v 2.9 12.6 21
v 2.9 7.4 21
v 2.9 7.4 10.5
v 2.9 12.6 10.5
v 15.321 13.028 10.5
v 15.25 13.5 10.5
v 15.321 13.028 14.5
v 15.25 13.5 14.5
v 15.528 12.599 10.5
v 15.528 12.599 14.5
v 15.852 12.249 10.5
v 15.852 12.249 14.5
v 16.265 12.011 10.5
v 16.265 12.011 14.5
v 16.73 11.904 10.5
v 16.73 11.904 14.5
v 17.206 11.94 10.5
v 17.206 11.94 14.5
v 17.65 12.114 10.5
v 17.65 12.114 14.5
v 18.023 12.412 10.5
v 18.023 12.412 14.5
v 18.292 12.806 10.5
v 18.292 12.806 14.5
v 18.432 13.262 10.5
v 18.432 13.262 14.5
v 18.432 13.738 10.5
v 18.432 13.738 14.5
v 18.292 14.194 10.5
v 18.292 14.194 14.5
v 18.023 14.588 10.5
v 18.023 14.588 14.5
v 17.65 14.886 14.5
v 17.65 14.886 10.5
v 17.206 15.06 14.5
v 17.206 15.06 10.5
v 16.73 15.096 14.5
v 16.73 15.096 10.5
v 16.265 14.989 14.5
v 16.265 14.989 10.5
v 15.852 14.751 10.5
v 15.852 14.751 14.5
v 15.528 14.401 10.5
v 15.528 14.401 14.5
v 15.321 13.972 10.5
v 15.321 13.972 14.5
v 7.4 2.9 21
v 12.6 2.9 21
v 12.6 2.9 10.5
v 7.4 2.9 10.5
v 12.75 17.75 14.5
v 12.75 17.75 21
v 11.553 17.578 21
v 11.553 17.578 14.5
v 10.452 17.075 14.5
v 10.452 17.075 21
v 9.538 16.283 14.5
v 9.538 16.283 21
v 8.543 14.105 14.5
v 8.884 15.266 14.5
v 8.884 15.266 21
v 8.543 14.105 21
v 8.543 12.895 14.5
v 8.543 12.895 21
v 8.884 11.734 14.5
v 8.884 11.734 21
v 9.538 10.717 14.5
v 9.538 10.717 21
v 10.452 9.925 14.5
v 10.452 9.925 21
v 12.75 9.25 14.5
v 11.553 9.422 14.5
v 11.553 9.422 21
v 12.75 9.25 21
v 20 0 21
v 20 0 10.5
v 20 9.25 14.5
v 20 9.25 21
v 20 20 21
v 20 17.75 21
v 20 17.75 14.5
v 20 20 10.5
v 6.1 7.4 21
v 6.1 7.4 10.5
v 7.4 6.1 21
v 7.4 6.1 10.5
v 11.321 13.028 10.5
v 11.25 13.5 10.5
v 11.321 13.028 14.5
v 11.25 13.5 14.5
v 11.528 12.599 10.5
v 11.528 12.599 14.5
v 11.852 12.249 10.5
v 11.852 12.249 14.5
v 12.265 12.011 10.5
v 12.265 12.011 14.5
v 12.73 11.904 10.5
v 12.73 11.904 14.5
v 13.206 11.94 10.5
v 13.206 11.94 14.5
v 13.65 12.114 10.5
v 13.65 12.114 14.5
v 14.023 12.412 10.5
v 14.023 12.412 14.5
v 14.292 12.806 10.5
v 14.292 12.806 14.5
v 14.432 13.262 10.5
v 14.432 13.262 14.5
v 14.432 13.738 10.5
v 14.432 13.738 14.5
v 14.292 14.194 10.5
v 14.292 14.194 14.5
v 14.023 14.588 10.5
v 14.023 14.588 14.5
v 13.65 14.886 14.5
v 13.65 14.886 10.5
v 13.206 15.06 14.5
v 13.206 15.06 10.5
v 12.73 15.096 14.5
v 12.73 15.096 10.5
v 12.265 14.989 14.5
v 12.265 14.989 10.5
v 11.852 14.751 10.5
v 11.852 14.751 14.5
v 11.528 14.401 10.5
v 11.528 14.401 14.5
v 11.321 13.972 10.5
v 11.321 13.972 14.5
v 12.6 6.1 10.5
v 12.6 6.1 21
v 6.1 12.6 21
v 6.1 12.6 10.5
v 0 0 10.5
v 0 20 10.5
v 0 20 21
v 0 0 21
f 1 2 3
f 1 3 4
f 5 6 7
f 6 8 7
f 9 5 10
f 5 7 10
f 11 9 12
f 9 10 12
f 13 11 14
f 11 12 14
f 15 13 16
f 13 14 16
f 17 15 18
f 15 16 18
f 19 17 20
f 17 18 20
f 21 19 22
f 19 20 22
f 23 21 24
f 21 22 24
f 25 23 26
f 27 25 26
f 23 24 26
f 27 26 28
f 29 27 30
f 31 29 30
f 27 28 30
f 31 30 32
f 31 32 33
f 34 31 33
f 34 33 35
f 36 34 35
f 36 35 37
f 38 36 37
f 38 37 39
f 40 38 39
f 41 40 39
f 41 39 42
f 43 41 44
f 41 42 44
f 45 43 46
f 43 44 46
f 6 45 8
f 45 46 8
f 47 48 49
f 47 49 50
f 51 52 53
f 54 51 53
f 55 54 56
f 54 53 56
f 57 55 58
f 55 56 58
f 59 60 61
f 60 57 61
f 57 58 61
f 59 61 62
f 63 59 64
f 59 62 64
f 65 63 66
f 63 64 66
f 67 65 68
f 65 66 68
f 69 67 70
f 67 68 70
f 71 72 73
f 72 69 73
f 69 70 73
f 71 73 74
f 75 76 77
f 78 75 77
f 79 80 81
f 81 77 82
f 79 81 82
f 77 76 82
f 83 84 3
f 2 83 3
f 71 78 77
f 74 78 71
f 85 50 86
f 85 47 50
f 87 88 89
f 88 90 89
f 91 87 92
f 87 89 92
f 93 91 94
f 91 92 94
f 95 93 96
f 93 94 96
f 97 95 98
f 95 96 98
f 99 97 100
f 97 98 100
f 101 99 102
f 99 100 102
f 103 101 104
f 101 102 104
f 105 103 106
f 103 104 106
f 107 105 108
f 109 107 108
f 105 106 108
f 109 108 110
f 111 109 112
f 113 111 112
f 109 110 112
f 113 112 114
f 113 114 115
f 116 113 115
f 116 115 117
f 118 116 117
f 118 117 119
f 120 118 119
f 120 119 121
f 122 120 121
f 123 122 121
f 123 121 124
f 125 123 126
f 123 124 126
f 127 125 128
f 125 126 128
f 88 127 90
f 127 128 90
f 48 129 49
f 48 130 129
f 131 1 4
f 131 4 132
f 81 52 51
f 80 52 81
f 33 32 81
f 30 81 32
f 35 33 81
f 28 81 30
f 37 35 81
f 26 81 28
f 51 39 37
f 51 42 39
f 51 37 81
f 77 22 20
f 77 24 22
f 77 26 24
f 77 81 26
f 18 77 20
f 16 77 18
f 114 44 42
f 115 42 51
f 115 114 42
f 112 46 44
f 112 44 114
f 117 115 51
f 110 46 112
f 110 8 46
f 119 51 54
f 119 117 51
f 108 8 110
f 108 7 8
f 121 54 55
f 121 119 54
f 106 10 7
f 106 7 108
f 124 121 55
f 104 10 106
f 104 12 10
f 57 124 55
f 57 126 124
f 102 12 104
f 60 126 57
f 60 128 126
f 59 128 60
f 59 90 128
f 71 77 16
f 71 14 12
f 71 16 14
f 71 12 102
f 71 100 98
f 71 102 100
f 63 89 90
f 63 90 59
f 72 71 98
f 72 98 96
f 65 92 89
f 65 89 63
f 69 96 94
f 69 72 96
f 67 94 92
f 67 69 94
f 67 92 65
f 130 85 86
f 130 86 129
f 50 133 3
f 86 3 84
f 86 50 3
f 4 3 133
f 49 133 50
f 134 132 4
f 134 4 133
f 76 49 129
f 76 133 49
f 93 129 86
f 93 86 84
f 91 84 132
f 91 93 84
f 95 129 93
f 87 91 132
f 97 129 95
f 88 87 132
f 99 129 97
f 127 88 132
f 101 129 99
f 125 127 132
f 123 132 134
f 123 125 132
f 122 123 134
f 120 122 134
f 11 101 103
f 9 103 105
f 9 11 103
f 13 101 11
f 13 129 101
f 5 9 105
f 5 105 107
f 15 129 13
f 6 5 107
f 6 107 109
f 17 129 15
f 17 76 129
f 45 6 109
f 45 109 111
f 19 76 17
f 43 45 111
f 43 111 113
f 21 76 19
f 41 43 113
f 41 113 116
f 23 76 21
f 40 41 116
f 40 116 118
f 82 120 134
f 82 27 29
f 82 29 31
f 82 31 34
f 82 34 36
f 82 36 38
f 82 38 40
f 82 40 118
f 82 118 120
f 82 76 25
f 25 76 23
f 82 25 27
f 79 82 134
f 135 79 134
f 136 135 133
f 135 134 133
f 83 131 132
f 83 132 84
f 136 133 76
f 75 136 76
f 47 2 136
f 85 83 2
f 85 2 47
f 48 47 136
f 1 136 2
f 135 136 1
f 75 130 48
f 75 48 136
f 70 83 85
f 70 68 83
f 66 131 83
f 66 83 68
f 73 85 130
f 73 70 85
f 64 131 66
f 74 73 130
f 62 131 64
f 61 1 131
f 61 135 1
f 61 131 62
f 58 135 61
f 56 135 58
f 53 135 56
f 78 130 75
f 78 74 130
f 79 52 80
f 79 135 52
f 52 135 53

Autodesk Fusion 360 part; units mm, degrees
sketch "スケッチ1" plane through (0, 0, 0) normal (0, 0, 1) x (1, 0, 0)
  line L0 (0, 0) -> (20, 0)
  line L1 (20, 0) -> (20, 20)
  line L2 (20, 20) -> (0, 20)
  line L3 (0, 20) -> (0, 0)
  dimension "d1" = 20
  dimension "d2" = 20
extrude "押し出し1" add sketch "スケッチ1" along normal blind 21
sketch "スケッチ2" plane through (20, 0, 0) normal (1, 0, 0) x (0, 1, 0)
  line L0 (0, 0) -> (20, 0)
  line L1 (20, 0) -> (20, 21)
  line L2 (20, 21) -> (0, 21)
  line L3 (0, 21) -> (0, 0)
  circle A0 centre (5, 5) radius 1.15
  dimension "d5" = 2.3
  dimension "d8" = 5
  dimension "d11" = 5
extrude "押し出し2" cut sketch "スケッチ2" against normal blind 25 contours A0
sketch "スケッチ7" plane through (0, 0, 21) normal (0, 0, 1) x (-1, 0, 0)
  line L0 (0, -20) -> (0, 0)
  line L1 (0, 0) -> (-20, 0)
  line L2 (-20, 0) -> (-20, -20)
  line L3 (-20, -20) -> (0, -20)
  line L4 (-12.75, -17.75) -> (-20, -17.75)
  line L5 (-20, -17.75) -> (-20, -9.25)
  line L6 (-20, -9.25) -> (-12.75, -9.25)
  line L7 (-8.5, -13.5) -> (-20, -13.5)
  circle A0 centre (-12.85, -13.5) radius 1.6
  circle A1 centre (-16.85, -13.5) radius 1.6
  arc A2 (-12.75, -17.75) -> (-8.5, -13.5) centre (-12.75, -13.5) ccw
  arc A3 (-8.5, -13.5) -> (-12.75, -9.25) centre (-12.75, -13.5) ccw
  point P0 (-8.5, -17.75)
  point P1 (-8.5, -9.25)
  dimension "d16" = 8.5
  dimension "d17" = 11.5
  dimension "d18" = 3.2
  dimension "d19" = 3.2
  dimension "d20" = 4
  dimension "d21" = 4.35
  dimension "d22" = 4.25
  dimension "d23" = 4.25
  dimension "d24" = 4.25
extrude "押し出し4" cut sketch "スケッチ7" against normal blind 6.5 contours L2 L4 L5 L7 A0 A1 A2 | L2 L5 L6 L7 A0 A1 A3
extrude "押し出し5" cut 2 faces at (12.2215, 13.3267, 21) (16.1057, 13.3074, 21) along direction (0, 0, -1) blind 26
sketch "スケッチ11" plane through (20, 0, 0) normal (1, 0, 0) x (0, 1, 0)
  line L0 (17.75, 21) -> (17.75, 14.5)
  line L1 (17.75, 14.5) -> (9.25, 14.5)
  line L2 (9.25, 14.5) -> (9.25, 21)
  line L3 (9.25, 21) -> (0, 21)
  line L4 (0, 21) -> (0, 0)
  line L5 (0, 0) -> (20, 0)
  line L6 (20, 0) -> (20, 21)
  line L7 (20, 21) -> (17.75, 21)
  circle A0 centre (5, 5) radius 1.15
  line L8 (0, 10.5) -> (20, 10.5)
  line L9 (20, 10.5) -> (20, 0)
  line L10 (20, 0) -> (0, 0)
  line L11 (0, 0) -> (0, 10.5)
  dimension "d34" = 4
extrude "押し出し8" cut sketch "スケッチ11" against normal blind 32 contours L4 L5 L6 L8 L9 L10 L11
sketch "スケッチ12" plane through (0, 0, 21) normal (0, 0, 1) x (-1, 0, 0)
  line L0 (-12.75, -17.75) -> (-20, -17.75)
  line L1 (-20, -17.75) -> (-20, -20)
  line L2 (-20, -20) -> (0, -20)
  line L3 (0, -20) -> (0, 0)
  line L4 (0, 0) -> (-20, 0)
  line L5 (-20, 0) -> (-20, -9.25)
  line L6 (-20, -9.25) -> (-12.75, -9.25)
  arc A0 (-12.75, -17.75) -> (-12.75, -9.25) centre (-12.75, -13.5) ccw
  line L7 (-2.9, -12.6) -> (-6.1, -12.6)
  line L8 (-6.1, -12.6) -> (-6.1, -7.4)
  line L9 (-6.1, -7.4) -> (-2.9, -7.4)
  line L10 (-2.9, -7.4) -> (-2.9, -12.6)
  line L11 (-12.6, -2.9) -> (-7.4, -2.9)
  line L12 (-7.4, -2.9) -> (-7.4, -6.1)
  line L13 (-7.4, -6.1) -> (-12.6, -6.1)
  line L14 (-12.6, -6.1) -> (-12.6, -2.9)
  dimension "d37" = 2.9
  dimension "d38" = 5.2
  dimension "d39" = 3.2
  dimension "d40" = 7.4
  dimension "d41" = 3.2
  dimension "d42" = 5.2
  dimension "d43" = 2.9
  dimension "d44" = 7.4
extrude "押し出し9" cut sketch "スケッチ12" against normal blind 22 contours L7 L8 L9 L10 | L11 L12 L13 L14
equation "d40 = 10 mm - 2.6 mm"
